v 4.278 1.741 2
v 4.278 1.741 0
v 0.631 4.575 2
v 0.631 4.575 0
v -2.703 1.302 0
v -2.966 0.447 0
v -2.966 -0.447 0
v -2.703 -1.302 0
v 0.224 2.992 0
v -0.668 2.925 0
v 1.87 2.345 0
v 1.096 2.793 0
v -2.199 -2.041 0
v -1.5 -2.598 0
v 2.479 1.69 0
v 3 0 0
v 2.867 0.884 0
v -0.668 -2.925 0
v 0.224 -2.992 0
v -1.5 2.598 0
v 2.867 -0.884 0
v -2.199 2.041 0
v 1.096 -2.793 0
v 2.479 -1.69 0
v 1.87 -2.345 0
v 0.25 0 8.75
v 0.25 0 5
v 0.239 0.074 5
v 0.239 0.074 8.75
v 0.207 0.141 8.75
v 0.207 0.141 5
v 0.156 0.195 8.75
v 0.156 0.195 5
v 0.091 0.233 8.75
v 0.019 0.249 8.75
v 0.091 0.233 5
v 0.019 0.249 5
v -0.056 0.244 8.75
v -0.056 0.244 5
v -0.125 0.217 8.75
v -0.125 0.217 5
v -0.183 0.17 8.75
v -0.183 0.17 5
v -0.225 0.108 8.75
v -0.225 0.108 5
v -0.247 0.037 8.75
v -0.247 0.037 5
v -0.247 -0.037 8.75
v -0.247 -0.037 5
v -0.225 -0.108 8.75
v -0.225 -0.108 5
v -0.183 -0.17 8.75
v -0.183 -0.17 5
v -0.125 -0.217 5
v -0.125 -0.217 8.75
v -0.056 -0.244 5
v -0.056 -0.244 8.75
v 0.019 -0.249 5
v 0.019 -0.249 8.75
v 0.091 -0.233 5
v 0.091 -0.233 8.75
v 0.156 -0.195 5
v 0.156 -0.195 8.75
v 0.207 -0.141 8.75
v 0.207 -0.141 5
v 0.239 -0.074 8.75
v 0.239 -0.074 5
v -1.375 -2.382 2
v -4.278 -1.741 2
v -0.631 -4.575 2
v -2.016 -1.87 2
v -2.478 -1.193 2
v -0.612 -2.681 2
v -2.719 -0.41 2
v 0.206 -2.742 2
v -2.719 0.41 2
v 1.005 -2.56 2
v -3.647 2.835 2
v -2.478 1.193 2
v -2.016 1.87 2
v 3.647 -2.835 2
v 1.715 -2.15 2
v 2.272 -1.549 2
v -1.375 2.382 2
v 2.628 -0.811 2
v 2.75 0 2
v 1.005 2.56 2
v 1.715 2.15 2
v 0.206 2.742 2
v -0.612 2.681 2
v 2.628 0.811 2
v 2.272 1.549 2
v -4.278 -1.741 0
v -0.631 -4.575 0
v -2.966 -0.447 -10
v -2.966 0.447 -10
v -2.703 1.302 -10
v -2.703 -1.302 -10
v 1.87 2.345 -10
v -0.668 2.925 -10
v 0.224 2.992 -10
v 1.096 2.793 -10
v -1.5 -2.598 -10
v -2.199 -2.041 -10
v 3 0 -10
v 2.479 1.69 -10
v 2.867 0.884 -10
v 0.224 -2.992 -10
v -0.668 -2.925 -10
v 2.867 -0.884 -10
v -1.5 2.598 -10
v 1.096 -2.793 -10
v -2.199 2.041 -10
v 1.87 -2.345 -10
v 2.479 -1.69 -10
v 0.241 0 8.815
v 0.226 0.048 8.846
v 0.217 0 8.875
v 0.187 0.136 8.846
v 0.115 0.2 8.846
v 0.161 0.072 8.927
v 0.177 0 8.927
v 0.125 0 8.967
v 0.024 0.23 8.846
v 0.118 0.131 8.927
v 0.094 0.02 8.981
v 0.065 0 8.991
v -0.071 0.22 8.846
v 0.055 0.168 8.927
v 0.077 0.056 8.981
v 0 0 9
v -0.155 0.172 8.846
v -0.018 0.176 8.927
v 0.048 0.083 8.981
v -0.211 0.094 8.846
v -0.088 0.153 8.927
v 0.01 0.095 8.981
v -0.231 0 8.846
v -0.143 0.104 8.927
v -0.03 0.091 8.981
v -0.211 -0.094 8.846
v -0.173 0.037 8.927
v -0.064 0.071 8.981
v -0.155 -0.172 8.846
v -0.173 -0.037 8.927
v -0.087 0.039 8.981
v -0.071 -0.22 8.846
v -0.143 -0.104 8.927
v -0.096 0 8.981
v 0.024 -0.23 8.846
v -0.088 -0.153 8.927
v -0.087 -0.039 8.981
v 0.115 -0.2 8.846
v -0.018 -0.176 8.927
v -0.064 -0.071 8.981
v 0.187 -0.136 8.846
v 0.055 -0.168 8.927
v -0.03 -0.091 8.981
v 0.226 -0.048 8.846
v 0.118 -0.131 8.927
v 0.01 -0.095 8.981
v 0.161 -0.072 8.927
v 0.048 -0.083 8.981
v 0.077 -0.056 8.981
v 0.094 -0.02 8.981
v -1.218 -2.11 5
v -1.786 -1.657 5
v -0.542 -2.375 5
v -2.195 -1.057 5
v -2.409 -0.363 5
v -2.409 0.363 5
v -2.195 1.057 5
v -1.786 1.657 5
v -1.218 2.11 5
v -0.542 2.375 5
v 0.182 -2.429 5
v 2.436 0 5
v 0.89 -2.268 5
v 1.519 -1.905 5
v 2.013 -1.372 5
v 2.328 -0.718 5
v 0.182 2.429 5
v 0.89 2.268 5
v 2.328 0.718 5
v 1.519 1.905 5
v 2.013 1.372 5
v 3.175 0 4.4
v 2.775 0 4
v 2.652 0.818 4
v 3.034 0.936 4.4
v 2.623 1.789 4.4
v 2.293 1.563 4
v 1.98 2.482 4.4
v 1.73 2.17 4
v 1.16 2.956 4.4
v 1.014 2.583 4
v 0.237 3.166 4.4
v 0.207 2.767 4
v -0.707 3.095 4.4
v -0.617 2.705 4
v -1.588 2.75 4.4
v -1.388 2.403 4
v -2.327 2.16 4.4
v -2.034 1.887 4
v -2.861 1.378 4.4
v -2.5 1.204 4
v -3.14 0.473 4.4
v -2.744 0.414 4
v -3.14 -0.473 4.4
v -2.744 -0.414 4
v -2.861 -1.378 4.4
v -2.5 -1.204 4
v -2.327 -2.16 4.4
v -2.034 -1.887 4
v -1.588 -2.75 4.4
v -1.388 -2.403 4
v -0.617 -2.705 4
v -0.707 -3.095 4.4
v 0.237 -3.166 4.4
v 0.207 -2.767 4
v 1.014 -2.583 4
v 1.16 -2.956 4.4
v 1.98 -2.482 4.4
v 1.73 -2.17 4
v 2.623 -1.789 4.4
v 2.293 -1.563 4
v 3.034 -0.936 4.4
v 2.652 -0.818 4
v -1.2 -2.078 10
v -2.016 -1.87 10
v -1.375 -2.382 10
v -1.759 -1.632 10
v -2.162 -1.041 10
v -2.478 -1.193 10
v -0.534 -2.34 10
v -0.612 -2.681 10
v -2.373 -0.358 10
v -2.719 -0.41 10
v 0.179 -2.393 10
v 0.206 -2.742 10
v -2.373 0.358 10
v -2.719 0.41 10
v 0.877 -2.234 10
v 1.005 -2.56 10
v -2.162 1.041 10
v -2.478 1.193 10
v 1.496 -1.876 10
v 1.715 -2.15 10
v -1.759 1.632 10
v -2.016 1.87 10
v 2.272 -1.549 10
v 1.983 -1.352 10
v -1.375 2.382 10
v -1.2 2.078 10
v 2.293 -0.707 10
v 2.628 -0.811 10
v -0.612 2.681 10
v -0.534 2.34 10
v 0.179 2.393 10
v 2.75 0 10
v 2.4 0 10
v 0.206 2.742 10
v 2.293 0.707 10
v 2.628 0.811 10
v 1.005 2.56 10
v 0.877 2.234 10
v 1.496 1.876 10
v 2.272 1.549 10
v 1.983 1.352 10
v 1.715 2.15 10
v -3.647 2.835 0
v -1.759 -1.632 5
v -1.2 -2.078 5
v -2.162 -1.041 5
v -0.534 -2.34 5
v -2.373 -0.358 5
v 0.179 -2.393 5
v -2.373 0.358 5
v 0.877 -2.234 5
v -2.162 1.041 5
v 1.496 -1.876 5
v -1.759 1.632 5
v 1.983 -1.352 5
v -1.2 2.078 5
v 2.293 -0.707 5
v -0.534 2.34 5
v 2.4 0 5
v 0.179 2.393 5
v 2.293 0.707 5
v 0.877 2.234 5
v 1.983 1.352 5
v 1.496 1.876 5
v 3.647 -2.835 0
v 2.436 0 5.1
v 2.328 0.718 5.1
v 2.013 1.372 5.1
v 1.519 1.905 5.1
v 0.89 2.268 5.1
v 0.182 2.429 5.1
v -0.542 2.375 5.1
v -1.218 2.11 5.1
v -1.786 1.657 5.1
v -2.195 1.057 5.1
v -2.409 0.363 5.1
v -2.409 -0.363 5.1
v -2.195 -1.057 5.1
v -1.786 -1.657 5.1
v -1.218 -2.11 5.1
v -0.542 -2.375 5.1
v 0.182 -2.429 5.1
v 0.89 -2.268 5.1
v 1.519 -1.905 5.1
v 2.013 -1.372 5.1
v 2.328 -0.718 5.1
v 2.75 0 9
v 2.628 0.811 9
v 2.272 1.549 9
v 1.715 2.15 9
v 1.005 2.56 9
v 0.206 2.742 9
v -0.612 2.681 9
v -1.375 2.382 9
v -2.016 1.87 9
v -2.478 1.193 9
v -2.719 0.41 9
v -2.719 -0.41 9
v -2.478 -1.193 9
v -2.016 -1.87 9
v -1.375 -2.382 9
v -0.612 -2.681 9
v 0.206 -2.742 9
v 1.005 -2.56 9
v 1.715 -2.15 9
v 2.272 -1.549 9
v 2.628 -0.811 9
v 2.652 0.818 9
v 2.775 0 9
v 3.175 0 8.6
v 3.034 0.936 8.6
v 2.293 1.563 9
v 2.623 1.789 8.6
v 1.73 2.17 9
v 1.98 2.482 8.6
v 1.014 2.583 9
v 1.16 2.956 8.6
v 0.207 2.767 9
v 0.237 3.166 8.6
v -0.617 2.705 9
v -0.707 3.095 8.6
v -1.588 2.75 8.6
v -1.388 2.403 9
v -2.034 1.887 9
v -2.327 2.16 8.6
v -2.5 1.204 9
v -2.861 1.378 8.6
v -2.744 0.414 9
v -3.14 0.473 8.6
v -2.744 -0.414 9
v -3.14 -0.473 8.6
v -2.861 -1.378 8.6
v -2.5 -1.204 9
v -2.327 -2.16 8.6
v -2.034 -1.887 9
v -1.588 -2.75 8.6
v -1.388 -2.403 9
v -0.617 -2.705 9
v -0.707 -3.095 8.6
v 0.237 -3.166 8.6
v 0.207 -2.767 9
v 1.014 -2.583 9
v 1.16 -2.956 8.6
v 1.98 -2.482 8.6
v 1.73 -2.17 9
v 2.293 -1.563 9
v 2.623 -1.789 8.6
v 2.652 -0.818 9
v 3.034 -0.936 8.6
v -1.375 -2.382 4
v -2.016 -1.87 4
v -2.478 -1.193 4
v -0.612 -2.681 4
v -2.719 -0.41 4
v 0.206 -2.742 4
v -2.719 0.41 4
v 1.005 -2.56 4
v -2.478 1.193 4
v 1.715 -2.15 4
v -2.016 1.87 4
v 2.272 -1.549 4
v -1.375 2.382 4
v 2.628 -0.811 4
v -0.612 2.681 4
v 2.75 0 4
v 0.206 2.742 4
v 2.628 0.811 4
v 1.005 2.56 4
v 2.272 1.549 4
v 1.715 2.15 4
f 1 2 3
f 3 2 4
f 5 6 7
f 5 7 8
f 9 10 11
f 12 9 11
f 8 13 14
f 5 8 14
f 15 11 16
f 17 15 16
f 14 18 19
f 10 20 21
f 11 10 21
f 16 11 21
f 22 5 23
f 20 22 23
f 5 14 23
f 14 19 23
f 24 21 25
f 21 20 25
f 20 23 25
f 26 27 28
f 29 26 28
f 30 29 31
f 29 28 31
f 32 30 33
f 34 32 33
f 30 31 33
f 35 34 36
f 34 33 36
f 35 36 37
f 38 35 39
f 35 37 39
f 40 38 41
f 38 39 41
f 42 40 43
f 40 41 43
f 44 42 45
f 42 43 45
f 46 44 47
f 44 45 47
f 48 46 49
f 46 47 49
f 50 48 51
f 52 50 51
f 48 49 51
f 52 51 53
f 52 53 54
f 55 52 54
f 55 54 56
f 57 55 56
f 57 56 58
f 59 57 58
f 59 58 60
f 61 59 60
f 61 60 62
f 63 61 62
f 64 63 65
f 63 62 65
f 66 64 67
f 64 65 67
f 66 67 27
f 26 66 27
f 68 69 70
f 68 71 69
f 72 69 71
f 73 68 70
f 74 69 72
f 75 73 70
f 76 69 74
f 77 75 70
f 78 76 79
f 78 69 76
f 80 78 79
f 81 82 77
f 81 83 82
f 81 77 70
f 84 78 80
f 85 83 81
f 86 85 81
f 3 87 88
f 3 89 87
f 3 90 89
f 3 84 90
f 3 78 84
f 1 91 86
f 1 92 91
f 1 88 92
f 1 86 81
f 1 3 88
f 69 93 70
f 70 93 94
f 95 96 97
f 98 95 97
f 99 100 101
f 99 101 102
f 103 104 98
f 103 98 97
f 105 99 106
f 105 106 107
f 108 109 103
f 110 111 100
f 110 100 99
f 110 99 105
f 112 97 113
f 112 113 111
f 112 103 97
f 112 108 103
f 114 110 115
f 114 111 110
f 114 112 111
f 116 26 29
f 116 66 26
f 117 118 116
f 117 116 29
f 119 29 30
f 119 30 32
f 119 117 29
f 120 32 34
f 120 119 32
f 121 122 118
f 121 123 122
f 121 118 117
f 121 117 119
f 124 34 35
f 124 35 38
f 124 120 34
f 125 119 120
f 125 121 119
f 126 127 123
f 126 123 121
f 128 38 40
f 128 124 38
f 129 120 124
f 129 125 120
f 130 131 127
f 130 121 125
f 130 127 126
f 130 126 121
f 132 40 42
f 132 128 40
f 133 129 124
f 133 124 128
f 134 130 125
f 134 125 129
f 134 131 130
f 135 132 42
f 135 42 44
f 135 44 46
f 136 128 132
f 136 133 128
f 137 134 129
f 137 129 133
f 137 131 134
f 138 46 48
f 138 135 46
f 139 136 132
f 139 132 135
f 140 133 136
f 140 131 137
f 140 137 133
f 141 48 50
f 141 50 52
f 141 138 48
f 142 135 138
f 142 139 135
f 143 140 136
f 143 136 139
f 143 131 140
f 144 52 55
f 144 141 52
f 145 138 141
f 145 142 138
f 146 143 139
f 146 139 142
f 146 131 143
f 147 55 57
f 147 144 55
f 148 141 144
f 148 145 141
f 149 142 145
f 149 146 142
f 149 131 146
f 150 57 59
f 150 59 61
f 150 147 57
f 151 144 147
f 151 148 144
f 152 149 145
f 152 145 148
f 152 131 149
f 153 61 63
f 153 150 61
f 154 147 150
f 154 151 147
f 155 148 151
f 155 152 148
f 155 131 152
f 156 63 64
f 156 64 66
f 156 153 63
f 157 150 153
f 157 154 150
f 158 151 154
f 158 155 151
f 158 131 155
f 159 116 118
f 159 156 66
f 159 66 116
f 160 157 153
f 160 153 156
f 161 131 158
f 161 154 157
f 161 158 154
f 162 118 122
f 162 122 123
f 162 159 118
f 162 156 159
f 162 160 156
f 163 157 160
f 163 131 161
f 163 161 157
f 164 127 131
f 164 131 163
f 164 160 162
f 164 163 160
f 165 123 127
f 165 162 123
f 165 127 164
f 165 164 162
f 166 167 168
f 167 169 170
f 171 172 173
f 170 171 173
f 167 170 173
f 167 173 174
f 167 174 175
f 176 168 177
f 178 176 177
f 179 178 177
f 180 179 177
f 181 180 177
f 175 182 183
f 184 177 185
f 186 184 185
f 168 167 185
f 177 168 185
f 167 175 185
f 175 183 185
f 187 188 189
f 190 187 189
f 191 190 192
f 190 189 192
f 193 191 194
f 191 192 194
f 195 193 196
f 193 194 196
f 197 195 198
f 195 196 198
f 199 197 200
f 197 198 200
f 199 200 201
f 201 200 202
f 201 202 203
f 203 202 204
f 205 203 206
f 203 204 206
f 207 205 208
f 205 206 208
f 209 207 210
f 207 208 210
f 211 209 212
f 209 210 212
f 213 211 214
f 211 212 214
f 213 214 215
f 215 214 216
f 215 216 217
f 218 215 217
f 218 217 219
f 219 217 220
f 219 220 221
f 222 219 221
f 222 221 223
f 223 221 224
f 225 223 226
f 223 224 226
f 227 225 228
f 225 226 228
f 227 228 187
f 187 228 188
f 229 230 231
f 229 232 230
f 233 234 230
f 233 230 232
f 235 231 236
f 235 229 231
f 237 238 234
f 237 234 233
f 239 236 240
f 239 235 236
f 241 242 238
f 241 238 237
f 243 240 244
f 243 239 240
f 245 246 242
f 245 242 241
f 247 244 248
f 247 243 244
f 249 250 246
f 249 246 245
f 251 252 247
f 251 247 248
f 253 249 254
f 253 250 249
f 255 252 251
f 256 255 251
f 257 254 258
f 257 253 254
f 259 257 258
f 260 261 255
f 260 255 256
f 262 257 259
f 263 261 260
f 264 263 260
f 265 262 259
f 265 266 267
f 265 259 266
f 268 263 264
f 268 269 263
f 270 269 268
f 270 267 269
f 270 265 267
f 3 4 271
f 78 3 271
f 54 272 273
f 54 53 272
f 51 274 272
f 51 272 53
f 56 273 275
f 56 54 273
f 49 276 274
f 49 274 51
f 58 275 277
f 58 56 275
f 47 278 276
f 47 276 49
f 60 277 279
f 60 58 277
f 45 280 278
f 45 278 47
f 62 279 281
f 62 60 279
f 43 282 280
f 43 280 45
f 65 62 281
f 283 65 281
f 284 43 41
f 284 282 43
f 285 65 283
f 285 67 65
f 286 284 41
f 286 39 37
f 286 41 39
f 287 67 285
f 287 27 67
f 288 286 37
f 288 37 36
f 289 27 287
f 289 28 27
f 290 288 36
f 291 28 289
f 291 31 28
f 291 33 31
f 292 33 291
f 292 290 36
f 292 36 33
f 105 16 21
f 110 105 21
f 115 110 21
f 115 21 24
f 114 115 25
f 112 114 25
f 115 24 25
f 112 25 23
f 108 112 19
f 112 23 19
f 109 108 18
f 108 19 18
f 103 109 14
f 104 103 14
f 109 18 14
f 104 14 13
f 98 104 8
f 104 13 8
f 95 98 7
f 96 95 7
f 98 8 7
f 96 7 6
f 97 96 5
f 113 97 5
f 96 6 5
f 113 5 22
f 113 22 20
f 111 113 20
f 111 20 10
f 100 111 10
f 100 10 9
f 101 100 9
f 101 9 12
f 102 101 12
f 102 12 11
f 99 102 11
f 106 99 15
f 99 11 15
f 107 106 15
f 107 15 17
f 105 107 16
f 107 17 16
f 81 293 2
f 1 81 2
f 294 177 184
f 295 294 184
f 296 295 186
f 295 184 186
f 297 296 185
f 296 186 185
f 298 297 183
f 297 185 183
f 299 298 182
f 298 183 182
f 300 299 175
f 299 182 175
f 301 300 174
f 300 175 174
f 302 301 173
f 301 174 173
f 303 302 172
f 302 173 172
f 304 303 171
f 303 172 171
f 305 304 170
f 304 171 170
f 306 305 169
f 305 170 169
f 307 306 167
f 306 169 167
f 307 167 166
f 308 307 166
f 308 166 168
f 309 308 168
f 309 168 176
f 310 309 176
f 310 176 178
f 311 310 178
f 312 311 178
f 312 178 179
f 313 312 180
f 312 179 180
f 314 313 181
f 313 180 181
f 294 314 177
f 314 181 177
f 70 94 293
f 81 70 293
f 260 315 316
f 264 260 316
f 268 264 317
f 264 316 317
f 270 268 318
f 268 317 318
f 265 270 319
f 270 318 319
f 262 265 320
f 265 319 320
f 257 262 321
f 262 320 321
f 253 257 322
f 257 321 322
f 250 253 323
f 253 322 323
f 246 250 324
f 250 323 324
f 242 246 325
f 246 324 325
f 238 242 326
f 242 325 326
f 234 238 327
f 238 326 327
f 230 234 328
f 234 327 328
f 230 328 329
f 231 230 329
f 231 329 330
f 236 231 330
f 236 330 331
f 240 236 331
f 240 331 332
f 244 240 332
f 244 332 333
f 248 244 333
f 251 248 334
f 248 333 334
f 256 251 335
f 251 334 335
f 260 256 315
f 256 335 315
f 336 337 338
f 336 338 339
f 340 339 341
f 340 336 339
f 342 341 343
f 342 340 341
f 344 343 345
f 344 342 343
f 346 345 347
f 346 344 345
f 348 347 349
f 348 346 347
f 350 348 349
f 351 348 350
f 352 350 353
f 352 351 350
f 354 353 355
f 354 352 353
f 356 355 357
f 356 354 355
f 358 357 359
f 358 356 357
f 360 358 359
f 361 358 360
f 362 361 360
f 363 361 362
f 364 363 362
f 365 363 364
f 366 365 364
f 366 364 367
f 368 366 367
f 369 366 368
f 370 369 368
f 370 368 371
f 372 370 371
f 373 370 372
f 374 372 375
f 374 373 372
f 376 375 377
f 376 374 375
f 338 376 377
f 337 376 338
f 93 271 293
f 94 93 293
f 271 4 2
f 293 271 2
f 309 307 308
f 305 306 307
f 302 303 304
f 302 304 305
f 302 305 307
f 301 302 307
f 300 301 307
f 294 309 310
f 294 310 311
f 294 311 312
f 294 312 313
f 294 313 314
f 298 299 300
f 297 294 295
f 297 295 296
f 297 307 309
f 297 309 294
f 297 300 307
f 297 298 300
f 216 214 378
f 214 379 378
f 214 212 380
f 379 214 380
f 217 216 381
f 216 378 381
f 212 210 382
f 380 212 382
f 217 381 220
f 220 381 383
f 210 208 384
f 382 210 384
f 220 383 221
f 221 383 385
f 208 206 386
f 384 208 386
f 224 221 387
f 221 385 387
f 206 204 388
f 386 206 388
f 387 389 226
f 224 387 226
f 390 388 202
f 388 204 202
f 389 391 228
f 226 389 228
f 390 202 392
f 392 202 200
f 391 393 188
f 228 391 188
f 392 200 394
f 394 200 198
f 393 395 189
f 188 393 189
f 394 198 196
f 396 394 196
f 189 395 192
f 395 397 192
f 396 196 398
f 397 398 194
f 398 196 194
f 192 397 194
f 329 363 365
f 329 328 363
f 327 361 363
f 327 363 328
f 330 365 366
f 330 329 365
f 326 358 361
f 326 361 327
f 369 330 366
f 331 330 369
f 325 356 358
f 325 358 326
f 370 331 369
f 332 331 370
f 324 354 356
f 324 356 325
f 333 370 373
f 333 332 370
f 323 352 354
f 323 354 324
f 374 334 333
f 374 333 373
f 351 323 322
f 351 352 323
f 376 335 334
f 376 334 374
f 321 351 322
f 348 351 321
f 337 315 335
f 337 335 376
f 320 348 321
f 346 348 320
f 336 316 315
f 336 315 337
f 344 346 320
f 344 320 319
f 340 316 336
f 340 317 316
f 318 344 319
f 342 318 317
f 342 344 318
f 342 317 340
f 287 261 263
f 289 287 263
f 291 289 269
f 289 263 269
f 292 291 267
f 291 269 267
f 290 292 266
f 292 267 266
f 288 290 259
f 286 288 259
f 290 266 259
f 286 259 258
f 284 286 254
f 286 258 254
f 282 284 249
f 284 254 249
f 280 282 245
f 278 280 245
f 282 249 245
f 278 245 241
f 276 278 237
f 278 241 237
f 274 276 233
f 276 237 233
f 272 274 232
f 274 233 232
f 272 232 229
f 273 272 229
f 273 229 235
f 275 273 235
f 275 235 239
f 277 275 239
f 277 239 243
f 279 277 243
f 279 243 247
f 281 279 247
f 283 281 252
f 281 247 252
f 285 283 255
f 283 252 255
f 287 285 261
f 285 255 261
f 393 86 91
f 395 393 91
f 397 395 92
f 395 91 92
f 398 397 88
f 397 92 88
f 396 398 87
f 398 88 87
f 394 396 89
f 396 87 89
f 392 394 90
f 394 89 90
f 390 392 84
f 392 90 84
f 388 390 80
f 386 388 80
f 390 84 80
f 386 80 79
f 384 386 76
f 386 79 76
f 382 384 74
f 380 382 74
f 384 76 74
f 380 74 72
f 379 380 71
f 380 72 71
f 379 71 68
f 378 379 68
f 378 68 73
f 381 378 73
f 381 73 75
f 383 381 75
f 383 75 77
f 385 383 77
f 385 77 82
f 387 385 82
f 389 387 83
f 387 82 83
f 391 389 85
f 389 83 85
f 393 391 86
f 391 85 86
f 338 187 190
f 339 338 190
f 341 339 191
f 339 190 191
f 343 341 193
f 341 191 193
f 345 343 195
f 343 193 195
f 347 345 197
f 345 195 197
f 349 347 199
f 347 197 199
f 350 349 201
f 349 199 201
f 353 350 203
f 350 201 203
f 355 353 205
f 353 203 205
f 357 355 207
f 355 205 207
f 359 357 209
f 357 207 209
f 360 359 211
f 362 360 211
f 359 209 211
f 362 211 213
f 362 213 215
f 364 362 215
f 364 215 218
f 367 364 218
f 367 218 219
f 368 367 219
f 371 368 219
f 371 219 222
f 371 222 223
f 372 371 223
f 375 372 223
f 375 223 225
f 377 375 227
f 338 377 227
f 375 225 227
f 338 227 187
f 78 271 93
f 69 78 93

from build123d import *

# Parameters (mm, degrees)
F1_DEPTH  = 2
F2_R      = 2.75
F3_DEPTH  = 2
F4_R      = 3.175
F5_DEPTH  = 5
F6_R      = 2.75
F7_DEPTH  = 1
F8_SIZE   = 0.4
F9_SIZE   = 0.4
F10_R     = 2.4
F11_DEPTH = 5
F12_R     = 0.25
F13_DEPTH = 4
F14_R     = 0.25
F15_R     = 3
F16_DEPTH = 10
F17_R     = 2.4363080126
F18_DEPTH = 0.1


with BuildPart() as f1:
    # F0 (on Top) → F1 (new body)
    with BuildSketch(Plane.XY):
        Polygon((0.631404222, 4.5754411855), (-3.6467461891, 2.834532689), (-4.2781504111, -1.7409084964), (-0.631404222, -4.5754411855), (3.6467461891, -2.834532689), (4.2781504111, 1.7409084964), align=None)
    extrude(amount=F1_DEPTH)

    # F2 (on face) → F3 (join)
    with BuildSketch(Plane.XY.offset(2)):
        Circle(F2_R)
    extrude(amount=F3_DEPTH)

    # F4 (on face) → F5 (join)
    with BuildSketch(Plane.XY.offset(4)):
        Circle(F4_R)
    extrude(amount=F5_DEPTH)

    # F6 (on face) → F7 (join)
    with BuildSketch(Plane.XY.offset(9)):
        Circle(F6_R)
    extrude(amount=F7_DEPTH)

    # F8
    f8_edges = [f1.edges().sort_by_distance(p)[0] for p in [
        (-3.175, 0, 9),
    ]]
    chamfer(f8_edges, length=F8_SIZE)

    # F9
    f9_edges = [f1.edges().sort_by_distance(p)[0] for p in [
        (-3.175, 0, 4),
    ]]
    chamfer(f9_edges, length=F9_SIZE)

    # F10 (on face) → F11 (cut)
    with BuildSketch(Plane.XY.offset(10)):
        Circle(F10_R)
    extrude(amount=-F11_DEPTH, mode=Mode.SUBTRACT)

    # F12 (on face) → F13 (join)
    with BuildSketch(Plane.XY.offset(5)):
        Circle(F12_R)
    extrude(amount=F13_DEPTH)

    # F14
    f14_edges = [f1.edges().sort_by_distance(p)[0] for p in [
        (-0.25, 0, 9),
    ]]
    fillet(f14_edges, radius=F14_R)


with BuildPart() as f16:
    # F15 (on face) → F16 (new body)
    with BuildSketch(Plane(origin=(0, 0, 0), x_dir=(1, 0, 0), z_dir=(0, 0, -1))):
        Circle(F15_R)
    extrude(amount=F16_DEPTH)


with BuildPart() as f18:
    # F17 (on face) → F18 (new body)
    with BuildSketch(Plane.XY.offset(5)):
        Circle(F17_R)
    extrude(amount=F18_DEPTH)


solid = Compound([f1.part, f16.part, f18.part])
